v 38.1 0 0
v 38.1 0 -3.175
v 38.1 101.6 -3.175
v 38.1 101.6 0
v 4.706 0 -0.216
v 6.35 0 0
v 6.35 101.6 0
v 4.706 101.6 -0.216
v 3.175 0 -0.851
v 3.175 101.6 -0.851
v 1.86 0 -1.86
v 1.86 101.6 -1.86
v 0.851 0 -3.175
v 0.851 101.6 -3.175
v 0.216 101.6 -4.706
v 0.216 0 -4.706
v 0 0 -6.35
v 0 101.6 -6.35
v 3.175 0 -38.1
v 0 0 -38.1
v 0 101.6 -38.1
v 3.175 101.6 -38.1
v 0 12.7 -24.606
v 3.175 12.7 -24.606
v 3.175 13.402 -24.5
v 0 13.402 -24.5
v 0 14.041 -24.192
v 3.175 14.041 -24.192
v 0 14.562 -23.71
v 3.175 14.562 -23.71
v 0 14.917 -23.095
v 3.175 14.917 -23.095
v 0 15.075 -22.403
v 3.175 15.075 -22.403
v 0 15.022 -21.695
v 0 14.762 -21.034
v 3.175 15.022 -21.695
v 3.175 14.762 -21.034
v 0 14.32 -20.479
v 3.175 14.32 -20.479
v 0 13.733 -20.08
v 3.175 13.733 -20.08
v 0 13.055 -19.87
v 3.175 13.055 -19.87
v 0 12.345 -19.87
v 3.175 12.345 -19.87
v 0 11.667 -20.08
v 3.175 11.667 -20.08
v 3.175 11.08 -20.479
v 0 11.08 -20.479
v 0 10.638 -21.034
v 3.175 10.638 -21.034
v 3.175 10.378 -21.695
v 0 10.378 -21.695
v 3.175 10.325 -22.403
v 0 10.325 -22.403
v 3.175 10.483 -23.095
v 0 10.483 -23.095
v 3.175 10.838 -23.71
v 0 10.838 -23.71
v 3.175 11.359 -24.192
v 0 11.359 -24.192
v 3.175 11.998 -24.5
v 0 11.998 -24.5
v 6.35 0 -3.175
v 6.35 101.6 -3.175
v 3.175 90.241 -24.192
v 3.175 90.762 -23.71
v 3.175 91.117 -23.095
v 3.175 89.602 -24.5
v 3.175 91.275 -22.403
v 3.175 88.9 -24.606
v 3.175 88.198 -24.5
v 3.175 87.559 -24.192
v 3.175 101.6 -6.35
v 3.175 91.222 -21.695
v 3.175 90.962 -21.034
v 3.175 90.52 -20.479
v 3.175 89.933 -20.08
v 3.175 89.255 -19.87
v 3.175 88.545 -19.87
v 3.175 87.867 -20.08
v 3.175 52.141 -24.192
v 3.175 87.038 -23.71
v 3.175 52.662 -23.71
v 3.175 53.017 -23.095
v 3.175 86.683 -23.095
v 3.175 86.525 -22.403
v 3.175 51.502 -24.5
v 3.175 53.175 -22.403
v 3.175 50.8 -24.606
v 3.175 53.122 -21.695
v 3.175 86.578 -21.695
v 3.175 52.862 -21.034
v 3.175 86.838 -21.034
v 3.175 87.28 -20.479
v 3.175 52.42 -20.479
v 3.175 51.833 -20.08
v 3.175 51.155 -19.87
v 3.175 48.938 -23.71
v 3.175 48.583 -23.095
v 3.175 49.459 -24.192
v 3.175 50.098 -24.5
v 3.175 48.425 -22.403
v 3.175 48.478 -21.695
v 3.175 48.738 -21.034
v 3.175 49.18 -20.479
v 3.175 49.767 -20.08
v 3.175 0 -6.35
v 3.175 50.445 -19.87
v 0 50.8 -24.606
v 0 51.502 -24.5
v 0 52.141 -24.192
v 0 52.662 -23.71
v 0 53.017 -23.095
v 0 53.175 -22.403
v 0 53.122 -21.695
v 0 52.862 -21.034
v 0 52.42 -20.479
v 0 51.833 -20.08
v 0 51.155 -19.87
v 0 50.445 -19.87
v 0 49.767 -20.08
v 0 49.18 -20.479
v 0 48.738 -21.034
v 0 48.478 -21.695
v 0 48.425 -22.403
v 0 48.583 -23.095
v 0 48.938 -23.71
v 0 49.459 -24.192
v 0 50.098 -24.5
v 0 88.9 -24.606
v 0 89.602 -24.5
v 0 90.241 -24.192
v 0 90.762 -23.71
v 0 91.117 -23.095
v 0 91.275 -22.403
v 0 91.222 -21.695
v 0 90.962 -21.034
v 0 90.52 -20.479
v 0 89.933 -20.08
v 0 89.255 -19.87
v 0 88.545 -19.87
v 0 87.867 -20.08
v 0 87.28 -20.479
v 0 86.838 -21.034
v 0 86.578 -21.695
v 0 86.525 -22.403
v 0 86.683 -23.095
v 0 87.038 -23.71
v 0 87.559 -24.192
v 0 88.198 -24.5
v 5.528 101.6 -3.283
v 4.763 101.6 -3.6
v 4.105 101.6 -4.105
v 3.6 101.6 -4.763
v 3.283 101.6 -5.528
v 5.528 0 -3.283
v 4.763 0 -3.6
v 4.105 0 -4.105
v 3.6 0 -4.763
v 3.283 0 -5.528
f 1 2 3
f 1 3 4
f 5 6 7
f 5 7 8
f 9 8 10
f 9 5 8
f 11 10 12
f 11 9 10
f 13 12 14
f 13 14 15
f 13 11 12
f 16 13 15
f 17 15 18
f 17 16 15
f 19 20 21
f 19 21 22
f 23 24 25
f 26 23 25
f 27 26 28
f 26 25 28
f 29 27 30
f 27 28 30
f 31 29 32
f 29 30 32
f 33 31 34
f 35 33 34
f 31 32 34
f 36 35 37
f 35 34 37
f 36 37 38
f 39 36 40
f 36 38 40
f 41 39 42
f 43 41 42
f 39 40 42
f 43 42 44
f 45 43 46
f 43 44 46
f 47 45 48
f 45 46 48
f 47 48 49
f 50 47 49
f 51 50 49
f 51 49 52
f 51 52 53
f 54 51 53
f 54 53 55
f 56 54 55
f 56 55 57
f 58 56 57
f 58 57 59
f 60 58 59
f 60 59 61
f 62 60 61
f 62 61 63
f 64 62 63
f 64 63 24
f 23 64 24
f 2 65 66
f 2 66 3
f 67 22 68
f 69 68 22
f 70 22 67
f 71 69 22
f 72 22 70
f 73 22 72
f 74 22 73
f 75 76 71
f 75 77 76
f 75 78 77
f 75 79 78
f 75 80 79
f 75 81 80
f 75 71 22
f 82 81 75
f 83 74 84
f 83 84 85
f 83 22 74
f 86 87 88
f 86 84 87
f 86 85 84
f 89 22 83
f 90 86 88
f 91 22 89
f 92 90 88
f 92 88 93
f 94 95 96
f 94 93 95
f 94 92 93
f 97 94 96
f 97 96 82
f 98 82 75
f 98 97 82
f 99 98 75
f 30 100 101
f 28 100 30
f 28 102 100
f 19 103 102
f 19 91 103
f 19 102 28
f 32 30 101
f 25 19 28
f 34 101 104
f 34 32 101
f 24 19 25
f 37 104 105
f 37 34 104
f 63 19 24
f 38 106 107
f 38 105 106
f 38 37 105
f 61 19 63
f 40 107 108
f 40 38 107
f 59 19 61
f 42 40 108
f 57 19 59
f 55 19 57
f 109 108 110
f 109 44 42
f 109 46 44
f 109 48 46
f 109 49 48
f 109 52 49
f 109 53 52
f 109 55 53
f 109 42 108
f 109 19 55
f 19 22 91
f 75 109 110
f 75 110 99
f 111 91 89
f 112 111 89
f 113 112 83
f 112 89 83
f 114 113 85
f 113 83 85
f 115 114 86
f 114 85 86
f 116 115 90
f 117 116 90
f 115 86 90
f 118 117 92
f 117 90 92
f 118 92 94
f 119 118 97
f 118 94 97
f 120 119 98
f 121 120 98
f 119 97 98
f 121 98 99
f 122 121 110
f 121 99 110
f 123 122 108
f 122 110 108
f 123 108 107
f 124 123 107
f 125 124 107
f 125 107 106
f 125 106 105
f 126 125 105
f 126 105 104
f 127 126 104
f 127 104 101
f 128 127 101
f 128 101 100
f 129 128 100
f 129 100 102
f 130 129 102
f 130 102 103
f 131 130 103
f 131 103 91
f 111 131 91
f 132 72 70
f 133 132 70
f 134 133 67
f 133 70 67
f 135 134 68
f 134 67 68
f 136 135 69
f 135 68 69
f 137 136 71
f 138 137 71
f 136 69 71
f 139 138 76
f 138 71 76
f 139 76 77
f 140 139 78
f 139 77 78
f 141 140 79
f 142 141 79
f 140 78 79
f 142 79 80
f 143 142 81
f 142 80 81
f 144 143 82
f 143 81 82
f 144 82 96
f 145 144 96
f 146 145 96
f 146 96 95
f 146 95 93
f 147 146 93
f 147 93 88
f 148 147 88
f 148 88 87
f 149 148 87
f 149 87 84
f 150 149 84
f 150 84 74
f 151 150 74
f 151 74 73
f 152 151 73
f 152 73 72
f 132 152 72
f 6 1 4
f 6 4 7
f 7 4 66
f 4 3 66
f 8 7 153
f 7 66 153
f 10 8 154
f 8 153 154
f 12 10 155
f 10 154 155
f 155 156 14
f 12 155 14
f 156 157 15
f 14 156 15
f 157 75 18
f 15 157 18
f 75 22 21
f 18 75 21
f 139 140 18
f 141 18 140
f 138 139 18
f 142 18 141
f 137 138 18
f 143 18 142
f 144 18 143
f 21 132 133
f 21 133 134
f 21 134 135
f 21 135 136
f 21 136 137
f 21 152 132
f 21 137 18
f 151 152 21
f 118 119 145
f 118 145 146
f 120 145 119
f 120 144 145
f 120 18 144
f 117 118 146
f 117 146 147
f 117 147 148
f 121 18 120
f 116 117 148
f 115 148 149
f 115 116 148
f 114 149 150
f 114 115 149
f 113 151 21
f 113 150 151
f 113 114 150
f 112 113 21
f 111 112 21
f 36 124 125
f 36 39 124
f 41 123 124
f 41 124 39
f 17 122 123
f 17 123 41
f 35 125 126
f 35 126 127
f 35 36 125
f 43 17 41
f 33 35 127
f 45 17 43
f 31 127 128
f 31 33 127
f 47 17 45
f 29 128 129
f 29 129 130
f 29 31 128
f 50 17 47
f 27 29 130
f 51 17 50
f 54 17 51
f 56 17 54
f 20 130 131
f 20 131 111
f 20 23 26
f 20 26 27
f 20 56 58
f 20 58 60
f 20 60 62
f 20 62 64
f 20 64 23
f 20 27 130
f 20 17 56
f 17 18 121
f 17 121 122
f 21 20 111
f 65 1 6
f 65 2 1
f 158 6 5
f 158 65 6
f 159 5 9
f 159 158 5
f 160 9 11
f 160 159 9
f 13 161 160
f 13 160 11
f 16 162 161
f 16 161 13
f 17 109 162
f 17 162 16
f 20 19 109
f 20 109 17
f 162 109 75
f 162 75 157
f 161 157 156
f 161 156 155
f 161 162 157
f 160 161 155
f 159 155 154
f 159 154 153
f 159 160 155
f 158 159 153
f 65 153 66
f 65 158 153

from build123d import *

# Parameters (mm, degrees)
BASE_FLANGE2_DEPTH = 101.6
SKETCH11_R         = 2.38125
CUT_EXTRUDE1_DEPTH = 114.990901501


# Sheet-metal steps are written as plain solids
with BuildPart() as part:
    # Sketch6 → Base-Flange2 (new body)
    with BuildSketch(Plane(origin=(0, 0, 0), x_dir=(1, 0, 0), z_dir=(0, 1, 0))):
        with BuildLine():
            Line((38.1, 0), (6.35, 0))
            ThreePointArc((6.35, 0), (1.859871939, 1.859871939), (0, 6.35))
            Line((0, 6.35), (0, 38.1))
            Line((0, 38.1), (3.175, 38.1))
            Line((3.175, 38.1), (3.175, 6.35))
            ThreePointArc((3.175, 6.35), (4.10493597, 4.10493597), (6.35, 3.175))
            Line((6.35, 3.175), (38.1, 3.175))
            Line((38.1, 3.175), (38.1, 0))
        make_face()
    extrude(amount=BASE_FLANGE2_DEPTH)

    # Sketch11 → Cut-Extrude1 (cut, through all)
    with BuildSketch(Plane(origin=(3.175, 0, 0), x_dir=(0, 0, -1), z_dir=(1, 0, 0))):
        with Locations((22.225, 88.9)):
            Circle(SKETCH11_R)
        with Locations((22.225, 12.7)):
            Circle(SKETCH11_R)
        with Locations((22.225, 50.8)):
            Circle(SKETCH11_R)
    extrude(amount=-CUT_EXTRUDE1_DEPTH, mode=Mode.SUBTRACT)


solid = part.part
